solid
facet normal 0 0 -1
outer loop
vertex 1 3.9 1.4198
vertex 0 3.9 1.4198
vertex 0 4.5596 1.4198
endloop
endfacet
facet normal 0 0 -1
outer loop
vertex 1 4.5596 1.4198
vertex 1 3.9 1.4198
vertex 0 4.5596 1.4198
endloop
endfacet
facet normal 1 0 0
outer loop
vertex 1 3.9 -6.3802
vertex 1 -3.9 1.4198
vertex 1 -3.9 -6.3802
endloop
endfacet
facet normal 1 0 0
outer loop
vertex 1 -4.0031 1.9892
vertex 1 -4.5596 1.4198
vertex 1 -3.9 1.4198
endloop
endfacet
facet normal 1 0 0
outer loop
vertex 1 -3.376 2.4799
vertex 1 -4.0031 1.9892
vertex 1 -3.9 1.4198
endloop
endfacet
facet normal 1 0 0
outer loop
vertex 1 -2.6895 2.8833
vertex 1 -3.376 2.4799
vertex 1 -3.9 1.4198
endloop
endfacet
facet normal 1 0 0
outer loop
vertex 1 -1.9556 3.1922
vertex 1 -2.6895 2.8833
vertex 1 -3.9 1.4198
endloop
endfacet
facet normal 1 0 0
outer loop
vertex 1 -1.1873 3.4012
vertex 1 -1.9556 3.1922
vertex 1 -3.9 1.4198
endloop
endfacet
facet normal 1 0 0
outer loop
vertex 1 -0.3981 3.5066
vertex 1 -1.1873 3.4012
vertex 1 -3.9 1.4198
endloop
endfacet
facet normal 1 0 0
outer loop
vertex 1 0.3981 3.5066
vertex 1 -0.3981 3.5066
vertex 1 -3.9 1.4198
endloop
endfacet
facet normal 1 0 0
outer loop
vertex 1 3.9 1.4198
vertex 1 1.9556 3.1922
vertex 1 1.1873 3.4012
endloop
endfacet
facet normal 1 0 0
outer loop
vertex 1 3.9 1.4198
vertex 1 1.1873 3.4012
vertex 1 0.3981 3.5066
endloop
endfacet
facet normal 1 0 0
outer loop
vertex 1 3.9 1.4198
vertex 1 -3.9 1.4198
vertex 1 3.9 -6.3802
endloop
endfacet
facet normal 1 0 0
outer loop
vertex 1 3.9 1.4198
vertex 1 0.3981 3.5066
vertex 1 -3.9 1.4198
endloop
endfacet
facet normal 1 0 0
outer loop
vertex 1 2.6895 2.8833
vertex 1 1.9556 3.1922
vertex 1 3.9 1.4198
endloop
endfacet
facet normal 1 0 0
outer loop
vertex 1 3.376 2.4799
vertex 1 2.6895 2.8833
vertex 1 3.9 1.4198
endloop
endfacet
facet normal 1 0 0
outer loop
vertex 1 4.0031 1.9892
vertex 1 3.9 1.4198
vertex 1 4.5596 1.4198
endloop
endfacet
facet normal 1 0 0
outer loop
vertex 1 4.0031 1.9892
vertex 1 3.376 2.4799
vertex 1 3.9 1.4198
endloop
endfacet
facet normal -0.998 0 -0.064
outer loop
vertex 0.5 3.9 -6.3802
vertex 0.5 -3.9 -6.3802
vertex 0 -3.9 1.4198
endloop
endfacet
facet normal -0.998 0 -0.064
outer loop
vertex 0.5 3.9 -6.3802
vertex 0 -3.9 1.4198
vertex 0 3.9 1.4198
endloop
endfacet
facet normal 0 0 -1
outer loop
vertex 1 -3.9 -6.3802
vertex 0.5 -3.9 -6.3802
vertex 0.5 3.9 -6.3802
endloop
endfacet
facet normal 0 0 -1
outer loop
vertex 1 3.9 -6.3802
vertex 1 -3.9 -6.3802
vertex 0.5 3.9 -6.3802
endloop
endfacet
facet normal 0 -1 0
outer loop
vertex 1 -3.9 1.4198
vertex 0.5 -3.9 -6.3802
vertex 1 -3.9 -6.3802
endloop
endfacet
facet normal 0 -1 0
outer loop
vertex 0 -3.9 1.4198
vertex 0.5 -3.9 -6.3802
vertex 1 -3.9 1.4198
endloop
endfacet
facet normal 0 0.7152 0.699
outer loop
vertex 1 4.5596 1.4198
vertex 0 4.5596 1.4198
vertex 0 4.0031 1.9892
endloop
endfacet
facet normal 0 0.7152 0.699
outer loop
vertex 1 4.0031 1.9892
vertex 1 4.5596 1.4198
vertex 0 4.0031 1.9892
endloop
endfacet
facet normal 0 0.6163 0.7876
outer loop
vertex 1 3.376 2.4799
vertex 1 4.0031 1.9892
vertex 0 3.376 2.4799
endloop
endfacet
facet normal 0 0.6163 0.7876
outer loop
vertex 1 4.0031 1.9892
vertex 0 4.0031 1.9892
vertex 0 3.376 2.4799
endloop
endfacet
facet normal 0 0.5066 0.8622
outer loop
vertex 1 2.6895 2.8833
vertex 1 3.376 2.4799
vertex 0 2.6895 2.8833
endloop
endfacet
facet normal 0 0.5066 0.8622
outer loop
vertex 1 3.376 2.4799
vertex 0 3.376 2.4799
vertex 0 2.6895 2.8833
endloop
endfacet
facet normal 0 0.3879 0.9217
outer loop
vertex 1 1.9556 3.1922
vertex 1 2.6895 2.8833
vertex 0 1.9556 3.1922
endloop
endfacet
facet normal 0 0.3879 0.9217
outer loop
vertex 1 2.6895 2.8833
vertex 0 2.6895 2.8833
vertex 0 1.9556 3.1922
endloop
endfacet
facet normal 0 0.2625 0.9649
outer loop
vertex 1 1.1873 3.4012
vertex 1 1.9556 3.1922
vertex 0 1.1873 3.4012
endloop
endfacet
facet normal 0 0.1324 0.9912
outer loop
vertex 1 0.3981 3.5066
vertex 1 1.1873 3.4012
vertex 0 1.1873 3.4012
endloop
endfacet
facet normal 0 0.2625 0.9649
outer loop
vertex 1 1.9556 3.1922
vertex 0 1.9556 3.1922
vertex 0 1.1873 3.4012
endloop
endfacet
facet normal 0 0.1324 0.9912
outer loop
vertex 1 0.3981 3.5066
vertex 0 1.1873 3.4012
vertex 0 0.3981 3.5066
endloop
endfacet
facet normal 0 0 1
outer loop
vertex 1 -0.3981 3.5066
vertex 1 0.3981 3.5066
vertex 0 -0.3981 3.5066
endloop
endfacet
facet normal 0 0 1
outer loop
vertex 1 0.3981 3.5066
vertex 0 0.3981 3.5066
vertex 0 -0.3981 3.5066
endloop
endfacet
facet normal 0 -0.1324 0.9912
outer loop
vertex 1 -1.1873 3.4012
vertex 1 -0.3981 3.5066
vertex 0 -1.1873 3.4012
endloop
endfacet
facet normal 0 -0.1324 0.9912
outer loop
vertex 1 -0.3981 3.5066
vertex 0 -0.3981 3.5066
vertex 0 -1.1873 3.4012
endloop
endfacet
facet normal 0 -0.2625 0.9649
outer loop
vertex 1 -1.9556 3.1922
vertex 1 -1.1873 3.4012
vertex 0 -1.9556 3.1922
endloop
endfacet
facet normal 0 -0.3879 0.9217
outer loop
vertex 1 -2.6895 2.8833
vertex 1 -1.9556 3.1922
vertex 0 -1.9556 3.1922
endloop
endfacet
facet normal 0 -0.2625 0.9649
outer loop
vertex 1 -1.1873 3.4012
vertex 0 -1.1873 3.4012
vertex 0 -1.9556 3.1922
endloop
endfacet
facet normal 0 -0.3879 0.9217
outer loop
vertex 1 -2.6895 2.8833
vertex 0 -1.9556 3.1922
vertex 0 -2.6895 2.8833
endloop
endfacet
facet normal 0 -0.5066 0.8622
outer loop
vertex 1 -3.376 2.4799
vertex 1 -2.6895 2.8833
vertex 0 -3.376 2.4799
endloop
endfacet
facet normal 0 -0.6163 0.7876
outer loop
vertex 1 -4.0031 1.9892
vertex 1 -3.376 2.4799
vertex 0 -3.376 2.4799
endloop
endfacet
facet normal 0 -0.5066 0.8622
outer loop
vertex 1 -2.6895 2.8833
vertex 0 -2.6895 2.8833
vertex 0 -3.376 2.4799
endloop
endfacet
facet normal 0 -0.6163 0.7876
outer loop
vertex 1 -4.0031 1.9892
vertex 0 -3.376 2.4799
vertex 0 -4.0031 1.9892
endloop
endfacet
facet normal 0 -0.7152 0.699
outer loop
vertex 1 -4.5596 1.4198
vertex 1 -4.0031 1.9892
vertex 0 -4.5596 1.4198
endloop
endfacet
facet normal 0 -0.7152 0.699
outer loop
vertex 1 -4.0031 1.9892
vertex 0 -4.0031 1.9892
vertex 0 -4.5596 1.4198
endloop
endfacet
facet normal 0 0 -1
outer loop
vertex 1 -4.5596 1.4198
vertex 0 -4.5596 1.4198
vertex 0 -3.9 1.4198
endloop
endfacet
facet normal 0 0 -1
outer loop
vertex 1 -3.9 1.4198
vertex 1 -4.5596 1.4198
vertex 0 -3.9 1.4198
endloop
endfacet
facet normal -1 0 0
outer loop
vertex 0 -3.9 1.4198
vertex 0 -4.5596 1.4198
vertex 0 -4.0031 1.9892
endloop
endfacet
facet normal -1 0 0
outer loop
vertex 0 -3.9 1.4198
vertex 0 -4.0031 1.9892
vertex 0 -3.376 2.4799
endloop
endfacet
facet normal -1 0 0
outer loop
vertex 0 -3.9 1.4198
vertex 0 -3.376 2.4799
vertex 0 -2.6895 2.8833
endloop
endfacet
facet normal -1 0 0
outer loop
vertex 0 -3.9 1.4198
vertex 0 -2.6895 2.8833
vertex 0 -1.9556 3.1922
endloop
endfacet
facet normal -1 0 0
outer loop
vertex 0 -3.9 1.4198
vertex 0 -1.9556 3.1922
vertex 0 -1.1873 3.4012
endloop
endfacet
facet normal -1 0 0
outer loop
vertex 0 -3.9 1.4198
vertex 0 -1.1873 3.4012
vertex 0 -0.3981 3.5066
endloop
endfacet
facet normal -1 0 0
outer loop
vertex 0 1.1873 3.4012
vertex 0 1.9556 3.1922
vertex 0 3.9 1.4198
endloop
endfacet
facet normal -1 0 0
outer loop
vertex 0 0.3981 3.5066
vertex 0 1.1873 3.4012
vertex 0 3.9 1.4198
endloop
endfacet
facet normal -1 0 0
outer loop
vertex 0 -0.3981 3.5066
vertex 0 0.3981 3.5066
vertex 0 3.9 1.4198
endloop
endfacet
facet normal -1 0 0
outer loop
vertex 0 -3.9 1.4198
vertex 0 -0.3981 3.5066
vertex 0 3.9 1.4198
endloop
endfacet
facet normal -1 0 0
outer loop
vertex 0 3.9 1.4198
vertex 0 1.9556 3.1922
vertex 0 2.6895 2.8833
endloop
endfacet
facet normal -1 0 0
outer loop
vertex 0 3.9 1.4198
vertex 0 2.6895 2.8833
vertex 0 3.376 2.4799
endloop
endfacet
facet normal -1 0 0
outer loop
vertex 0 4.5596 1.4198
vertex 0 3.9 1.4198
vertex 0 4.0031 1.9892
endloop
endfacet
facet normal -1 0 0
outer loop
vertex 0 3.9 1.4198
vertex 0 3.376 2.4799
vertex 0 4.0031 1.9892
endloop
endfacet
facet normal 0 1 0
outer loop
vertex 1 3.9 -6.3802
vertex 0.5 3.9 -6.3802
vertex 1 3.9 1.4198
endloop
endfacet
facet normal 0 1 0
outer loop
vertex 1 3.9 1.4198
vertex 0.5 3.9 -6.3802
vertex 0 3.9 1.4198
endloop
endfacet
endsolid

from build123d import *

# Parameters (mm, degrees)
F0_W     = 7.8
F0_H     = 7.8
F1_DEPTH = 1
F2_SIZE2 = 0.5
F2_SIZE  = 7.8


# Not quite as in the source:
# - a feature names something its author has since deleted; it is built from what else it names


with BuildPart() as f1:
    # F0 (on Right) → F1 (new body)
    with BuildSketch(Plane.YZ):
        with BuildLine():
            Line((-3.9, 1.419822283), (3.9, 1.419822283))
            Line((3.9, 1.419822283), (4.5596052461, 1.419822283))
            ThreePointArc((4.5596052461, 1.419822283), (0, 3.519822283), (-4.5596052461, 1.419822283))
            Line((-4.5596052461, 1.419822283), (-3.9, 1.419822283))
        make_face()
        with Locations((0, -2.480177717)):
            Rectangle(F0_W, F0_H)
    extrude(amount=F1_DEPTH)

    # F2
    f2_edges = [f1.edges().sort_by_distance(p)[0] for p in [
        (0, 0, -6.380178),
    ]]
    f2_side = f1.faces().sort_by_distance((0, 0, -1.62771))[0]
    chamfer(f2_edges, length=F2_SIZE, length2=F2_SIZE2, reference=f2_side)


solid = f1.part
